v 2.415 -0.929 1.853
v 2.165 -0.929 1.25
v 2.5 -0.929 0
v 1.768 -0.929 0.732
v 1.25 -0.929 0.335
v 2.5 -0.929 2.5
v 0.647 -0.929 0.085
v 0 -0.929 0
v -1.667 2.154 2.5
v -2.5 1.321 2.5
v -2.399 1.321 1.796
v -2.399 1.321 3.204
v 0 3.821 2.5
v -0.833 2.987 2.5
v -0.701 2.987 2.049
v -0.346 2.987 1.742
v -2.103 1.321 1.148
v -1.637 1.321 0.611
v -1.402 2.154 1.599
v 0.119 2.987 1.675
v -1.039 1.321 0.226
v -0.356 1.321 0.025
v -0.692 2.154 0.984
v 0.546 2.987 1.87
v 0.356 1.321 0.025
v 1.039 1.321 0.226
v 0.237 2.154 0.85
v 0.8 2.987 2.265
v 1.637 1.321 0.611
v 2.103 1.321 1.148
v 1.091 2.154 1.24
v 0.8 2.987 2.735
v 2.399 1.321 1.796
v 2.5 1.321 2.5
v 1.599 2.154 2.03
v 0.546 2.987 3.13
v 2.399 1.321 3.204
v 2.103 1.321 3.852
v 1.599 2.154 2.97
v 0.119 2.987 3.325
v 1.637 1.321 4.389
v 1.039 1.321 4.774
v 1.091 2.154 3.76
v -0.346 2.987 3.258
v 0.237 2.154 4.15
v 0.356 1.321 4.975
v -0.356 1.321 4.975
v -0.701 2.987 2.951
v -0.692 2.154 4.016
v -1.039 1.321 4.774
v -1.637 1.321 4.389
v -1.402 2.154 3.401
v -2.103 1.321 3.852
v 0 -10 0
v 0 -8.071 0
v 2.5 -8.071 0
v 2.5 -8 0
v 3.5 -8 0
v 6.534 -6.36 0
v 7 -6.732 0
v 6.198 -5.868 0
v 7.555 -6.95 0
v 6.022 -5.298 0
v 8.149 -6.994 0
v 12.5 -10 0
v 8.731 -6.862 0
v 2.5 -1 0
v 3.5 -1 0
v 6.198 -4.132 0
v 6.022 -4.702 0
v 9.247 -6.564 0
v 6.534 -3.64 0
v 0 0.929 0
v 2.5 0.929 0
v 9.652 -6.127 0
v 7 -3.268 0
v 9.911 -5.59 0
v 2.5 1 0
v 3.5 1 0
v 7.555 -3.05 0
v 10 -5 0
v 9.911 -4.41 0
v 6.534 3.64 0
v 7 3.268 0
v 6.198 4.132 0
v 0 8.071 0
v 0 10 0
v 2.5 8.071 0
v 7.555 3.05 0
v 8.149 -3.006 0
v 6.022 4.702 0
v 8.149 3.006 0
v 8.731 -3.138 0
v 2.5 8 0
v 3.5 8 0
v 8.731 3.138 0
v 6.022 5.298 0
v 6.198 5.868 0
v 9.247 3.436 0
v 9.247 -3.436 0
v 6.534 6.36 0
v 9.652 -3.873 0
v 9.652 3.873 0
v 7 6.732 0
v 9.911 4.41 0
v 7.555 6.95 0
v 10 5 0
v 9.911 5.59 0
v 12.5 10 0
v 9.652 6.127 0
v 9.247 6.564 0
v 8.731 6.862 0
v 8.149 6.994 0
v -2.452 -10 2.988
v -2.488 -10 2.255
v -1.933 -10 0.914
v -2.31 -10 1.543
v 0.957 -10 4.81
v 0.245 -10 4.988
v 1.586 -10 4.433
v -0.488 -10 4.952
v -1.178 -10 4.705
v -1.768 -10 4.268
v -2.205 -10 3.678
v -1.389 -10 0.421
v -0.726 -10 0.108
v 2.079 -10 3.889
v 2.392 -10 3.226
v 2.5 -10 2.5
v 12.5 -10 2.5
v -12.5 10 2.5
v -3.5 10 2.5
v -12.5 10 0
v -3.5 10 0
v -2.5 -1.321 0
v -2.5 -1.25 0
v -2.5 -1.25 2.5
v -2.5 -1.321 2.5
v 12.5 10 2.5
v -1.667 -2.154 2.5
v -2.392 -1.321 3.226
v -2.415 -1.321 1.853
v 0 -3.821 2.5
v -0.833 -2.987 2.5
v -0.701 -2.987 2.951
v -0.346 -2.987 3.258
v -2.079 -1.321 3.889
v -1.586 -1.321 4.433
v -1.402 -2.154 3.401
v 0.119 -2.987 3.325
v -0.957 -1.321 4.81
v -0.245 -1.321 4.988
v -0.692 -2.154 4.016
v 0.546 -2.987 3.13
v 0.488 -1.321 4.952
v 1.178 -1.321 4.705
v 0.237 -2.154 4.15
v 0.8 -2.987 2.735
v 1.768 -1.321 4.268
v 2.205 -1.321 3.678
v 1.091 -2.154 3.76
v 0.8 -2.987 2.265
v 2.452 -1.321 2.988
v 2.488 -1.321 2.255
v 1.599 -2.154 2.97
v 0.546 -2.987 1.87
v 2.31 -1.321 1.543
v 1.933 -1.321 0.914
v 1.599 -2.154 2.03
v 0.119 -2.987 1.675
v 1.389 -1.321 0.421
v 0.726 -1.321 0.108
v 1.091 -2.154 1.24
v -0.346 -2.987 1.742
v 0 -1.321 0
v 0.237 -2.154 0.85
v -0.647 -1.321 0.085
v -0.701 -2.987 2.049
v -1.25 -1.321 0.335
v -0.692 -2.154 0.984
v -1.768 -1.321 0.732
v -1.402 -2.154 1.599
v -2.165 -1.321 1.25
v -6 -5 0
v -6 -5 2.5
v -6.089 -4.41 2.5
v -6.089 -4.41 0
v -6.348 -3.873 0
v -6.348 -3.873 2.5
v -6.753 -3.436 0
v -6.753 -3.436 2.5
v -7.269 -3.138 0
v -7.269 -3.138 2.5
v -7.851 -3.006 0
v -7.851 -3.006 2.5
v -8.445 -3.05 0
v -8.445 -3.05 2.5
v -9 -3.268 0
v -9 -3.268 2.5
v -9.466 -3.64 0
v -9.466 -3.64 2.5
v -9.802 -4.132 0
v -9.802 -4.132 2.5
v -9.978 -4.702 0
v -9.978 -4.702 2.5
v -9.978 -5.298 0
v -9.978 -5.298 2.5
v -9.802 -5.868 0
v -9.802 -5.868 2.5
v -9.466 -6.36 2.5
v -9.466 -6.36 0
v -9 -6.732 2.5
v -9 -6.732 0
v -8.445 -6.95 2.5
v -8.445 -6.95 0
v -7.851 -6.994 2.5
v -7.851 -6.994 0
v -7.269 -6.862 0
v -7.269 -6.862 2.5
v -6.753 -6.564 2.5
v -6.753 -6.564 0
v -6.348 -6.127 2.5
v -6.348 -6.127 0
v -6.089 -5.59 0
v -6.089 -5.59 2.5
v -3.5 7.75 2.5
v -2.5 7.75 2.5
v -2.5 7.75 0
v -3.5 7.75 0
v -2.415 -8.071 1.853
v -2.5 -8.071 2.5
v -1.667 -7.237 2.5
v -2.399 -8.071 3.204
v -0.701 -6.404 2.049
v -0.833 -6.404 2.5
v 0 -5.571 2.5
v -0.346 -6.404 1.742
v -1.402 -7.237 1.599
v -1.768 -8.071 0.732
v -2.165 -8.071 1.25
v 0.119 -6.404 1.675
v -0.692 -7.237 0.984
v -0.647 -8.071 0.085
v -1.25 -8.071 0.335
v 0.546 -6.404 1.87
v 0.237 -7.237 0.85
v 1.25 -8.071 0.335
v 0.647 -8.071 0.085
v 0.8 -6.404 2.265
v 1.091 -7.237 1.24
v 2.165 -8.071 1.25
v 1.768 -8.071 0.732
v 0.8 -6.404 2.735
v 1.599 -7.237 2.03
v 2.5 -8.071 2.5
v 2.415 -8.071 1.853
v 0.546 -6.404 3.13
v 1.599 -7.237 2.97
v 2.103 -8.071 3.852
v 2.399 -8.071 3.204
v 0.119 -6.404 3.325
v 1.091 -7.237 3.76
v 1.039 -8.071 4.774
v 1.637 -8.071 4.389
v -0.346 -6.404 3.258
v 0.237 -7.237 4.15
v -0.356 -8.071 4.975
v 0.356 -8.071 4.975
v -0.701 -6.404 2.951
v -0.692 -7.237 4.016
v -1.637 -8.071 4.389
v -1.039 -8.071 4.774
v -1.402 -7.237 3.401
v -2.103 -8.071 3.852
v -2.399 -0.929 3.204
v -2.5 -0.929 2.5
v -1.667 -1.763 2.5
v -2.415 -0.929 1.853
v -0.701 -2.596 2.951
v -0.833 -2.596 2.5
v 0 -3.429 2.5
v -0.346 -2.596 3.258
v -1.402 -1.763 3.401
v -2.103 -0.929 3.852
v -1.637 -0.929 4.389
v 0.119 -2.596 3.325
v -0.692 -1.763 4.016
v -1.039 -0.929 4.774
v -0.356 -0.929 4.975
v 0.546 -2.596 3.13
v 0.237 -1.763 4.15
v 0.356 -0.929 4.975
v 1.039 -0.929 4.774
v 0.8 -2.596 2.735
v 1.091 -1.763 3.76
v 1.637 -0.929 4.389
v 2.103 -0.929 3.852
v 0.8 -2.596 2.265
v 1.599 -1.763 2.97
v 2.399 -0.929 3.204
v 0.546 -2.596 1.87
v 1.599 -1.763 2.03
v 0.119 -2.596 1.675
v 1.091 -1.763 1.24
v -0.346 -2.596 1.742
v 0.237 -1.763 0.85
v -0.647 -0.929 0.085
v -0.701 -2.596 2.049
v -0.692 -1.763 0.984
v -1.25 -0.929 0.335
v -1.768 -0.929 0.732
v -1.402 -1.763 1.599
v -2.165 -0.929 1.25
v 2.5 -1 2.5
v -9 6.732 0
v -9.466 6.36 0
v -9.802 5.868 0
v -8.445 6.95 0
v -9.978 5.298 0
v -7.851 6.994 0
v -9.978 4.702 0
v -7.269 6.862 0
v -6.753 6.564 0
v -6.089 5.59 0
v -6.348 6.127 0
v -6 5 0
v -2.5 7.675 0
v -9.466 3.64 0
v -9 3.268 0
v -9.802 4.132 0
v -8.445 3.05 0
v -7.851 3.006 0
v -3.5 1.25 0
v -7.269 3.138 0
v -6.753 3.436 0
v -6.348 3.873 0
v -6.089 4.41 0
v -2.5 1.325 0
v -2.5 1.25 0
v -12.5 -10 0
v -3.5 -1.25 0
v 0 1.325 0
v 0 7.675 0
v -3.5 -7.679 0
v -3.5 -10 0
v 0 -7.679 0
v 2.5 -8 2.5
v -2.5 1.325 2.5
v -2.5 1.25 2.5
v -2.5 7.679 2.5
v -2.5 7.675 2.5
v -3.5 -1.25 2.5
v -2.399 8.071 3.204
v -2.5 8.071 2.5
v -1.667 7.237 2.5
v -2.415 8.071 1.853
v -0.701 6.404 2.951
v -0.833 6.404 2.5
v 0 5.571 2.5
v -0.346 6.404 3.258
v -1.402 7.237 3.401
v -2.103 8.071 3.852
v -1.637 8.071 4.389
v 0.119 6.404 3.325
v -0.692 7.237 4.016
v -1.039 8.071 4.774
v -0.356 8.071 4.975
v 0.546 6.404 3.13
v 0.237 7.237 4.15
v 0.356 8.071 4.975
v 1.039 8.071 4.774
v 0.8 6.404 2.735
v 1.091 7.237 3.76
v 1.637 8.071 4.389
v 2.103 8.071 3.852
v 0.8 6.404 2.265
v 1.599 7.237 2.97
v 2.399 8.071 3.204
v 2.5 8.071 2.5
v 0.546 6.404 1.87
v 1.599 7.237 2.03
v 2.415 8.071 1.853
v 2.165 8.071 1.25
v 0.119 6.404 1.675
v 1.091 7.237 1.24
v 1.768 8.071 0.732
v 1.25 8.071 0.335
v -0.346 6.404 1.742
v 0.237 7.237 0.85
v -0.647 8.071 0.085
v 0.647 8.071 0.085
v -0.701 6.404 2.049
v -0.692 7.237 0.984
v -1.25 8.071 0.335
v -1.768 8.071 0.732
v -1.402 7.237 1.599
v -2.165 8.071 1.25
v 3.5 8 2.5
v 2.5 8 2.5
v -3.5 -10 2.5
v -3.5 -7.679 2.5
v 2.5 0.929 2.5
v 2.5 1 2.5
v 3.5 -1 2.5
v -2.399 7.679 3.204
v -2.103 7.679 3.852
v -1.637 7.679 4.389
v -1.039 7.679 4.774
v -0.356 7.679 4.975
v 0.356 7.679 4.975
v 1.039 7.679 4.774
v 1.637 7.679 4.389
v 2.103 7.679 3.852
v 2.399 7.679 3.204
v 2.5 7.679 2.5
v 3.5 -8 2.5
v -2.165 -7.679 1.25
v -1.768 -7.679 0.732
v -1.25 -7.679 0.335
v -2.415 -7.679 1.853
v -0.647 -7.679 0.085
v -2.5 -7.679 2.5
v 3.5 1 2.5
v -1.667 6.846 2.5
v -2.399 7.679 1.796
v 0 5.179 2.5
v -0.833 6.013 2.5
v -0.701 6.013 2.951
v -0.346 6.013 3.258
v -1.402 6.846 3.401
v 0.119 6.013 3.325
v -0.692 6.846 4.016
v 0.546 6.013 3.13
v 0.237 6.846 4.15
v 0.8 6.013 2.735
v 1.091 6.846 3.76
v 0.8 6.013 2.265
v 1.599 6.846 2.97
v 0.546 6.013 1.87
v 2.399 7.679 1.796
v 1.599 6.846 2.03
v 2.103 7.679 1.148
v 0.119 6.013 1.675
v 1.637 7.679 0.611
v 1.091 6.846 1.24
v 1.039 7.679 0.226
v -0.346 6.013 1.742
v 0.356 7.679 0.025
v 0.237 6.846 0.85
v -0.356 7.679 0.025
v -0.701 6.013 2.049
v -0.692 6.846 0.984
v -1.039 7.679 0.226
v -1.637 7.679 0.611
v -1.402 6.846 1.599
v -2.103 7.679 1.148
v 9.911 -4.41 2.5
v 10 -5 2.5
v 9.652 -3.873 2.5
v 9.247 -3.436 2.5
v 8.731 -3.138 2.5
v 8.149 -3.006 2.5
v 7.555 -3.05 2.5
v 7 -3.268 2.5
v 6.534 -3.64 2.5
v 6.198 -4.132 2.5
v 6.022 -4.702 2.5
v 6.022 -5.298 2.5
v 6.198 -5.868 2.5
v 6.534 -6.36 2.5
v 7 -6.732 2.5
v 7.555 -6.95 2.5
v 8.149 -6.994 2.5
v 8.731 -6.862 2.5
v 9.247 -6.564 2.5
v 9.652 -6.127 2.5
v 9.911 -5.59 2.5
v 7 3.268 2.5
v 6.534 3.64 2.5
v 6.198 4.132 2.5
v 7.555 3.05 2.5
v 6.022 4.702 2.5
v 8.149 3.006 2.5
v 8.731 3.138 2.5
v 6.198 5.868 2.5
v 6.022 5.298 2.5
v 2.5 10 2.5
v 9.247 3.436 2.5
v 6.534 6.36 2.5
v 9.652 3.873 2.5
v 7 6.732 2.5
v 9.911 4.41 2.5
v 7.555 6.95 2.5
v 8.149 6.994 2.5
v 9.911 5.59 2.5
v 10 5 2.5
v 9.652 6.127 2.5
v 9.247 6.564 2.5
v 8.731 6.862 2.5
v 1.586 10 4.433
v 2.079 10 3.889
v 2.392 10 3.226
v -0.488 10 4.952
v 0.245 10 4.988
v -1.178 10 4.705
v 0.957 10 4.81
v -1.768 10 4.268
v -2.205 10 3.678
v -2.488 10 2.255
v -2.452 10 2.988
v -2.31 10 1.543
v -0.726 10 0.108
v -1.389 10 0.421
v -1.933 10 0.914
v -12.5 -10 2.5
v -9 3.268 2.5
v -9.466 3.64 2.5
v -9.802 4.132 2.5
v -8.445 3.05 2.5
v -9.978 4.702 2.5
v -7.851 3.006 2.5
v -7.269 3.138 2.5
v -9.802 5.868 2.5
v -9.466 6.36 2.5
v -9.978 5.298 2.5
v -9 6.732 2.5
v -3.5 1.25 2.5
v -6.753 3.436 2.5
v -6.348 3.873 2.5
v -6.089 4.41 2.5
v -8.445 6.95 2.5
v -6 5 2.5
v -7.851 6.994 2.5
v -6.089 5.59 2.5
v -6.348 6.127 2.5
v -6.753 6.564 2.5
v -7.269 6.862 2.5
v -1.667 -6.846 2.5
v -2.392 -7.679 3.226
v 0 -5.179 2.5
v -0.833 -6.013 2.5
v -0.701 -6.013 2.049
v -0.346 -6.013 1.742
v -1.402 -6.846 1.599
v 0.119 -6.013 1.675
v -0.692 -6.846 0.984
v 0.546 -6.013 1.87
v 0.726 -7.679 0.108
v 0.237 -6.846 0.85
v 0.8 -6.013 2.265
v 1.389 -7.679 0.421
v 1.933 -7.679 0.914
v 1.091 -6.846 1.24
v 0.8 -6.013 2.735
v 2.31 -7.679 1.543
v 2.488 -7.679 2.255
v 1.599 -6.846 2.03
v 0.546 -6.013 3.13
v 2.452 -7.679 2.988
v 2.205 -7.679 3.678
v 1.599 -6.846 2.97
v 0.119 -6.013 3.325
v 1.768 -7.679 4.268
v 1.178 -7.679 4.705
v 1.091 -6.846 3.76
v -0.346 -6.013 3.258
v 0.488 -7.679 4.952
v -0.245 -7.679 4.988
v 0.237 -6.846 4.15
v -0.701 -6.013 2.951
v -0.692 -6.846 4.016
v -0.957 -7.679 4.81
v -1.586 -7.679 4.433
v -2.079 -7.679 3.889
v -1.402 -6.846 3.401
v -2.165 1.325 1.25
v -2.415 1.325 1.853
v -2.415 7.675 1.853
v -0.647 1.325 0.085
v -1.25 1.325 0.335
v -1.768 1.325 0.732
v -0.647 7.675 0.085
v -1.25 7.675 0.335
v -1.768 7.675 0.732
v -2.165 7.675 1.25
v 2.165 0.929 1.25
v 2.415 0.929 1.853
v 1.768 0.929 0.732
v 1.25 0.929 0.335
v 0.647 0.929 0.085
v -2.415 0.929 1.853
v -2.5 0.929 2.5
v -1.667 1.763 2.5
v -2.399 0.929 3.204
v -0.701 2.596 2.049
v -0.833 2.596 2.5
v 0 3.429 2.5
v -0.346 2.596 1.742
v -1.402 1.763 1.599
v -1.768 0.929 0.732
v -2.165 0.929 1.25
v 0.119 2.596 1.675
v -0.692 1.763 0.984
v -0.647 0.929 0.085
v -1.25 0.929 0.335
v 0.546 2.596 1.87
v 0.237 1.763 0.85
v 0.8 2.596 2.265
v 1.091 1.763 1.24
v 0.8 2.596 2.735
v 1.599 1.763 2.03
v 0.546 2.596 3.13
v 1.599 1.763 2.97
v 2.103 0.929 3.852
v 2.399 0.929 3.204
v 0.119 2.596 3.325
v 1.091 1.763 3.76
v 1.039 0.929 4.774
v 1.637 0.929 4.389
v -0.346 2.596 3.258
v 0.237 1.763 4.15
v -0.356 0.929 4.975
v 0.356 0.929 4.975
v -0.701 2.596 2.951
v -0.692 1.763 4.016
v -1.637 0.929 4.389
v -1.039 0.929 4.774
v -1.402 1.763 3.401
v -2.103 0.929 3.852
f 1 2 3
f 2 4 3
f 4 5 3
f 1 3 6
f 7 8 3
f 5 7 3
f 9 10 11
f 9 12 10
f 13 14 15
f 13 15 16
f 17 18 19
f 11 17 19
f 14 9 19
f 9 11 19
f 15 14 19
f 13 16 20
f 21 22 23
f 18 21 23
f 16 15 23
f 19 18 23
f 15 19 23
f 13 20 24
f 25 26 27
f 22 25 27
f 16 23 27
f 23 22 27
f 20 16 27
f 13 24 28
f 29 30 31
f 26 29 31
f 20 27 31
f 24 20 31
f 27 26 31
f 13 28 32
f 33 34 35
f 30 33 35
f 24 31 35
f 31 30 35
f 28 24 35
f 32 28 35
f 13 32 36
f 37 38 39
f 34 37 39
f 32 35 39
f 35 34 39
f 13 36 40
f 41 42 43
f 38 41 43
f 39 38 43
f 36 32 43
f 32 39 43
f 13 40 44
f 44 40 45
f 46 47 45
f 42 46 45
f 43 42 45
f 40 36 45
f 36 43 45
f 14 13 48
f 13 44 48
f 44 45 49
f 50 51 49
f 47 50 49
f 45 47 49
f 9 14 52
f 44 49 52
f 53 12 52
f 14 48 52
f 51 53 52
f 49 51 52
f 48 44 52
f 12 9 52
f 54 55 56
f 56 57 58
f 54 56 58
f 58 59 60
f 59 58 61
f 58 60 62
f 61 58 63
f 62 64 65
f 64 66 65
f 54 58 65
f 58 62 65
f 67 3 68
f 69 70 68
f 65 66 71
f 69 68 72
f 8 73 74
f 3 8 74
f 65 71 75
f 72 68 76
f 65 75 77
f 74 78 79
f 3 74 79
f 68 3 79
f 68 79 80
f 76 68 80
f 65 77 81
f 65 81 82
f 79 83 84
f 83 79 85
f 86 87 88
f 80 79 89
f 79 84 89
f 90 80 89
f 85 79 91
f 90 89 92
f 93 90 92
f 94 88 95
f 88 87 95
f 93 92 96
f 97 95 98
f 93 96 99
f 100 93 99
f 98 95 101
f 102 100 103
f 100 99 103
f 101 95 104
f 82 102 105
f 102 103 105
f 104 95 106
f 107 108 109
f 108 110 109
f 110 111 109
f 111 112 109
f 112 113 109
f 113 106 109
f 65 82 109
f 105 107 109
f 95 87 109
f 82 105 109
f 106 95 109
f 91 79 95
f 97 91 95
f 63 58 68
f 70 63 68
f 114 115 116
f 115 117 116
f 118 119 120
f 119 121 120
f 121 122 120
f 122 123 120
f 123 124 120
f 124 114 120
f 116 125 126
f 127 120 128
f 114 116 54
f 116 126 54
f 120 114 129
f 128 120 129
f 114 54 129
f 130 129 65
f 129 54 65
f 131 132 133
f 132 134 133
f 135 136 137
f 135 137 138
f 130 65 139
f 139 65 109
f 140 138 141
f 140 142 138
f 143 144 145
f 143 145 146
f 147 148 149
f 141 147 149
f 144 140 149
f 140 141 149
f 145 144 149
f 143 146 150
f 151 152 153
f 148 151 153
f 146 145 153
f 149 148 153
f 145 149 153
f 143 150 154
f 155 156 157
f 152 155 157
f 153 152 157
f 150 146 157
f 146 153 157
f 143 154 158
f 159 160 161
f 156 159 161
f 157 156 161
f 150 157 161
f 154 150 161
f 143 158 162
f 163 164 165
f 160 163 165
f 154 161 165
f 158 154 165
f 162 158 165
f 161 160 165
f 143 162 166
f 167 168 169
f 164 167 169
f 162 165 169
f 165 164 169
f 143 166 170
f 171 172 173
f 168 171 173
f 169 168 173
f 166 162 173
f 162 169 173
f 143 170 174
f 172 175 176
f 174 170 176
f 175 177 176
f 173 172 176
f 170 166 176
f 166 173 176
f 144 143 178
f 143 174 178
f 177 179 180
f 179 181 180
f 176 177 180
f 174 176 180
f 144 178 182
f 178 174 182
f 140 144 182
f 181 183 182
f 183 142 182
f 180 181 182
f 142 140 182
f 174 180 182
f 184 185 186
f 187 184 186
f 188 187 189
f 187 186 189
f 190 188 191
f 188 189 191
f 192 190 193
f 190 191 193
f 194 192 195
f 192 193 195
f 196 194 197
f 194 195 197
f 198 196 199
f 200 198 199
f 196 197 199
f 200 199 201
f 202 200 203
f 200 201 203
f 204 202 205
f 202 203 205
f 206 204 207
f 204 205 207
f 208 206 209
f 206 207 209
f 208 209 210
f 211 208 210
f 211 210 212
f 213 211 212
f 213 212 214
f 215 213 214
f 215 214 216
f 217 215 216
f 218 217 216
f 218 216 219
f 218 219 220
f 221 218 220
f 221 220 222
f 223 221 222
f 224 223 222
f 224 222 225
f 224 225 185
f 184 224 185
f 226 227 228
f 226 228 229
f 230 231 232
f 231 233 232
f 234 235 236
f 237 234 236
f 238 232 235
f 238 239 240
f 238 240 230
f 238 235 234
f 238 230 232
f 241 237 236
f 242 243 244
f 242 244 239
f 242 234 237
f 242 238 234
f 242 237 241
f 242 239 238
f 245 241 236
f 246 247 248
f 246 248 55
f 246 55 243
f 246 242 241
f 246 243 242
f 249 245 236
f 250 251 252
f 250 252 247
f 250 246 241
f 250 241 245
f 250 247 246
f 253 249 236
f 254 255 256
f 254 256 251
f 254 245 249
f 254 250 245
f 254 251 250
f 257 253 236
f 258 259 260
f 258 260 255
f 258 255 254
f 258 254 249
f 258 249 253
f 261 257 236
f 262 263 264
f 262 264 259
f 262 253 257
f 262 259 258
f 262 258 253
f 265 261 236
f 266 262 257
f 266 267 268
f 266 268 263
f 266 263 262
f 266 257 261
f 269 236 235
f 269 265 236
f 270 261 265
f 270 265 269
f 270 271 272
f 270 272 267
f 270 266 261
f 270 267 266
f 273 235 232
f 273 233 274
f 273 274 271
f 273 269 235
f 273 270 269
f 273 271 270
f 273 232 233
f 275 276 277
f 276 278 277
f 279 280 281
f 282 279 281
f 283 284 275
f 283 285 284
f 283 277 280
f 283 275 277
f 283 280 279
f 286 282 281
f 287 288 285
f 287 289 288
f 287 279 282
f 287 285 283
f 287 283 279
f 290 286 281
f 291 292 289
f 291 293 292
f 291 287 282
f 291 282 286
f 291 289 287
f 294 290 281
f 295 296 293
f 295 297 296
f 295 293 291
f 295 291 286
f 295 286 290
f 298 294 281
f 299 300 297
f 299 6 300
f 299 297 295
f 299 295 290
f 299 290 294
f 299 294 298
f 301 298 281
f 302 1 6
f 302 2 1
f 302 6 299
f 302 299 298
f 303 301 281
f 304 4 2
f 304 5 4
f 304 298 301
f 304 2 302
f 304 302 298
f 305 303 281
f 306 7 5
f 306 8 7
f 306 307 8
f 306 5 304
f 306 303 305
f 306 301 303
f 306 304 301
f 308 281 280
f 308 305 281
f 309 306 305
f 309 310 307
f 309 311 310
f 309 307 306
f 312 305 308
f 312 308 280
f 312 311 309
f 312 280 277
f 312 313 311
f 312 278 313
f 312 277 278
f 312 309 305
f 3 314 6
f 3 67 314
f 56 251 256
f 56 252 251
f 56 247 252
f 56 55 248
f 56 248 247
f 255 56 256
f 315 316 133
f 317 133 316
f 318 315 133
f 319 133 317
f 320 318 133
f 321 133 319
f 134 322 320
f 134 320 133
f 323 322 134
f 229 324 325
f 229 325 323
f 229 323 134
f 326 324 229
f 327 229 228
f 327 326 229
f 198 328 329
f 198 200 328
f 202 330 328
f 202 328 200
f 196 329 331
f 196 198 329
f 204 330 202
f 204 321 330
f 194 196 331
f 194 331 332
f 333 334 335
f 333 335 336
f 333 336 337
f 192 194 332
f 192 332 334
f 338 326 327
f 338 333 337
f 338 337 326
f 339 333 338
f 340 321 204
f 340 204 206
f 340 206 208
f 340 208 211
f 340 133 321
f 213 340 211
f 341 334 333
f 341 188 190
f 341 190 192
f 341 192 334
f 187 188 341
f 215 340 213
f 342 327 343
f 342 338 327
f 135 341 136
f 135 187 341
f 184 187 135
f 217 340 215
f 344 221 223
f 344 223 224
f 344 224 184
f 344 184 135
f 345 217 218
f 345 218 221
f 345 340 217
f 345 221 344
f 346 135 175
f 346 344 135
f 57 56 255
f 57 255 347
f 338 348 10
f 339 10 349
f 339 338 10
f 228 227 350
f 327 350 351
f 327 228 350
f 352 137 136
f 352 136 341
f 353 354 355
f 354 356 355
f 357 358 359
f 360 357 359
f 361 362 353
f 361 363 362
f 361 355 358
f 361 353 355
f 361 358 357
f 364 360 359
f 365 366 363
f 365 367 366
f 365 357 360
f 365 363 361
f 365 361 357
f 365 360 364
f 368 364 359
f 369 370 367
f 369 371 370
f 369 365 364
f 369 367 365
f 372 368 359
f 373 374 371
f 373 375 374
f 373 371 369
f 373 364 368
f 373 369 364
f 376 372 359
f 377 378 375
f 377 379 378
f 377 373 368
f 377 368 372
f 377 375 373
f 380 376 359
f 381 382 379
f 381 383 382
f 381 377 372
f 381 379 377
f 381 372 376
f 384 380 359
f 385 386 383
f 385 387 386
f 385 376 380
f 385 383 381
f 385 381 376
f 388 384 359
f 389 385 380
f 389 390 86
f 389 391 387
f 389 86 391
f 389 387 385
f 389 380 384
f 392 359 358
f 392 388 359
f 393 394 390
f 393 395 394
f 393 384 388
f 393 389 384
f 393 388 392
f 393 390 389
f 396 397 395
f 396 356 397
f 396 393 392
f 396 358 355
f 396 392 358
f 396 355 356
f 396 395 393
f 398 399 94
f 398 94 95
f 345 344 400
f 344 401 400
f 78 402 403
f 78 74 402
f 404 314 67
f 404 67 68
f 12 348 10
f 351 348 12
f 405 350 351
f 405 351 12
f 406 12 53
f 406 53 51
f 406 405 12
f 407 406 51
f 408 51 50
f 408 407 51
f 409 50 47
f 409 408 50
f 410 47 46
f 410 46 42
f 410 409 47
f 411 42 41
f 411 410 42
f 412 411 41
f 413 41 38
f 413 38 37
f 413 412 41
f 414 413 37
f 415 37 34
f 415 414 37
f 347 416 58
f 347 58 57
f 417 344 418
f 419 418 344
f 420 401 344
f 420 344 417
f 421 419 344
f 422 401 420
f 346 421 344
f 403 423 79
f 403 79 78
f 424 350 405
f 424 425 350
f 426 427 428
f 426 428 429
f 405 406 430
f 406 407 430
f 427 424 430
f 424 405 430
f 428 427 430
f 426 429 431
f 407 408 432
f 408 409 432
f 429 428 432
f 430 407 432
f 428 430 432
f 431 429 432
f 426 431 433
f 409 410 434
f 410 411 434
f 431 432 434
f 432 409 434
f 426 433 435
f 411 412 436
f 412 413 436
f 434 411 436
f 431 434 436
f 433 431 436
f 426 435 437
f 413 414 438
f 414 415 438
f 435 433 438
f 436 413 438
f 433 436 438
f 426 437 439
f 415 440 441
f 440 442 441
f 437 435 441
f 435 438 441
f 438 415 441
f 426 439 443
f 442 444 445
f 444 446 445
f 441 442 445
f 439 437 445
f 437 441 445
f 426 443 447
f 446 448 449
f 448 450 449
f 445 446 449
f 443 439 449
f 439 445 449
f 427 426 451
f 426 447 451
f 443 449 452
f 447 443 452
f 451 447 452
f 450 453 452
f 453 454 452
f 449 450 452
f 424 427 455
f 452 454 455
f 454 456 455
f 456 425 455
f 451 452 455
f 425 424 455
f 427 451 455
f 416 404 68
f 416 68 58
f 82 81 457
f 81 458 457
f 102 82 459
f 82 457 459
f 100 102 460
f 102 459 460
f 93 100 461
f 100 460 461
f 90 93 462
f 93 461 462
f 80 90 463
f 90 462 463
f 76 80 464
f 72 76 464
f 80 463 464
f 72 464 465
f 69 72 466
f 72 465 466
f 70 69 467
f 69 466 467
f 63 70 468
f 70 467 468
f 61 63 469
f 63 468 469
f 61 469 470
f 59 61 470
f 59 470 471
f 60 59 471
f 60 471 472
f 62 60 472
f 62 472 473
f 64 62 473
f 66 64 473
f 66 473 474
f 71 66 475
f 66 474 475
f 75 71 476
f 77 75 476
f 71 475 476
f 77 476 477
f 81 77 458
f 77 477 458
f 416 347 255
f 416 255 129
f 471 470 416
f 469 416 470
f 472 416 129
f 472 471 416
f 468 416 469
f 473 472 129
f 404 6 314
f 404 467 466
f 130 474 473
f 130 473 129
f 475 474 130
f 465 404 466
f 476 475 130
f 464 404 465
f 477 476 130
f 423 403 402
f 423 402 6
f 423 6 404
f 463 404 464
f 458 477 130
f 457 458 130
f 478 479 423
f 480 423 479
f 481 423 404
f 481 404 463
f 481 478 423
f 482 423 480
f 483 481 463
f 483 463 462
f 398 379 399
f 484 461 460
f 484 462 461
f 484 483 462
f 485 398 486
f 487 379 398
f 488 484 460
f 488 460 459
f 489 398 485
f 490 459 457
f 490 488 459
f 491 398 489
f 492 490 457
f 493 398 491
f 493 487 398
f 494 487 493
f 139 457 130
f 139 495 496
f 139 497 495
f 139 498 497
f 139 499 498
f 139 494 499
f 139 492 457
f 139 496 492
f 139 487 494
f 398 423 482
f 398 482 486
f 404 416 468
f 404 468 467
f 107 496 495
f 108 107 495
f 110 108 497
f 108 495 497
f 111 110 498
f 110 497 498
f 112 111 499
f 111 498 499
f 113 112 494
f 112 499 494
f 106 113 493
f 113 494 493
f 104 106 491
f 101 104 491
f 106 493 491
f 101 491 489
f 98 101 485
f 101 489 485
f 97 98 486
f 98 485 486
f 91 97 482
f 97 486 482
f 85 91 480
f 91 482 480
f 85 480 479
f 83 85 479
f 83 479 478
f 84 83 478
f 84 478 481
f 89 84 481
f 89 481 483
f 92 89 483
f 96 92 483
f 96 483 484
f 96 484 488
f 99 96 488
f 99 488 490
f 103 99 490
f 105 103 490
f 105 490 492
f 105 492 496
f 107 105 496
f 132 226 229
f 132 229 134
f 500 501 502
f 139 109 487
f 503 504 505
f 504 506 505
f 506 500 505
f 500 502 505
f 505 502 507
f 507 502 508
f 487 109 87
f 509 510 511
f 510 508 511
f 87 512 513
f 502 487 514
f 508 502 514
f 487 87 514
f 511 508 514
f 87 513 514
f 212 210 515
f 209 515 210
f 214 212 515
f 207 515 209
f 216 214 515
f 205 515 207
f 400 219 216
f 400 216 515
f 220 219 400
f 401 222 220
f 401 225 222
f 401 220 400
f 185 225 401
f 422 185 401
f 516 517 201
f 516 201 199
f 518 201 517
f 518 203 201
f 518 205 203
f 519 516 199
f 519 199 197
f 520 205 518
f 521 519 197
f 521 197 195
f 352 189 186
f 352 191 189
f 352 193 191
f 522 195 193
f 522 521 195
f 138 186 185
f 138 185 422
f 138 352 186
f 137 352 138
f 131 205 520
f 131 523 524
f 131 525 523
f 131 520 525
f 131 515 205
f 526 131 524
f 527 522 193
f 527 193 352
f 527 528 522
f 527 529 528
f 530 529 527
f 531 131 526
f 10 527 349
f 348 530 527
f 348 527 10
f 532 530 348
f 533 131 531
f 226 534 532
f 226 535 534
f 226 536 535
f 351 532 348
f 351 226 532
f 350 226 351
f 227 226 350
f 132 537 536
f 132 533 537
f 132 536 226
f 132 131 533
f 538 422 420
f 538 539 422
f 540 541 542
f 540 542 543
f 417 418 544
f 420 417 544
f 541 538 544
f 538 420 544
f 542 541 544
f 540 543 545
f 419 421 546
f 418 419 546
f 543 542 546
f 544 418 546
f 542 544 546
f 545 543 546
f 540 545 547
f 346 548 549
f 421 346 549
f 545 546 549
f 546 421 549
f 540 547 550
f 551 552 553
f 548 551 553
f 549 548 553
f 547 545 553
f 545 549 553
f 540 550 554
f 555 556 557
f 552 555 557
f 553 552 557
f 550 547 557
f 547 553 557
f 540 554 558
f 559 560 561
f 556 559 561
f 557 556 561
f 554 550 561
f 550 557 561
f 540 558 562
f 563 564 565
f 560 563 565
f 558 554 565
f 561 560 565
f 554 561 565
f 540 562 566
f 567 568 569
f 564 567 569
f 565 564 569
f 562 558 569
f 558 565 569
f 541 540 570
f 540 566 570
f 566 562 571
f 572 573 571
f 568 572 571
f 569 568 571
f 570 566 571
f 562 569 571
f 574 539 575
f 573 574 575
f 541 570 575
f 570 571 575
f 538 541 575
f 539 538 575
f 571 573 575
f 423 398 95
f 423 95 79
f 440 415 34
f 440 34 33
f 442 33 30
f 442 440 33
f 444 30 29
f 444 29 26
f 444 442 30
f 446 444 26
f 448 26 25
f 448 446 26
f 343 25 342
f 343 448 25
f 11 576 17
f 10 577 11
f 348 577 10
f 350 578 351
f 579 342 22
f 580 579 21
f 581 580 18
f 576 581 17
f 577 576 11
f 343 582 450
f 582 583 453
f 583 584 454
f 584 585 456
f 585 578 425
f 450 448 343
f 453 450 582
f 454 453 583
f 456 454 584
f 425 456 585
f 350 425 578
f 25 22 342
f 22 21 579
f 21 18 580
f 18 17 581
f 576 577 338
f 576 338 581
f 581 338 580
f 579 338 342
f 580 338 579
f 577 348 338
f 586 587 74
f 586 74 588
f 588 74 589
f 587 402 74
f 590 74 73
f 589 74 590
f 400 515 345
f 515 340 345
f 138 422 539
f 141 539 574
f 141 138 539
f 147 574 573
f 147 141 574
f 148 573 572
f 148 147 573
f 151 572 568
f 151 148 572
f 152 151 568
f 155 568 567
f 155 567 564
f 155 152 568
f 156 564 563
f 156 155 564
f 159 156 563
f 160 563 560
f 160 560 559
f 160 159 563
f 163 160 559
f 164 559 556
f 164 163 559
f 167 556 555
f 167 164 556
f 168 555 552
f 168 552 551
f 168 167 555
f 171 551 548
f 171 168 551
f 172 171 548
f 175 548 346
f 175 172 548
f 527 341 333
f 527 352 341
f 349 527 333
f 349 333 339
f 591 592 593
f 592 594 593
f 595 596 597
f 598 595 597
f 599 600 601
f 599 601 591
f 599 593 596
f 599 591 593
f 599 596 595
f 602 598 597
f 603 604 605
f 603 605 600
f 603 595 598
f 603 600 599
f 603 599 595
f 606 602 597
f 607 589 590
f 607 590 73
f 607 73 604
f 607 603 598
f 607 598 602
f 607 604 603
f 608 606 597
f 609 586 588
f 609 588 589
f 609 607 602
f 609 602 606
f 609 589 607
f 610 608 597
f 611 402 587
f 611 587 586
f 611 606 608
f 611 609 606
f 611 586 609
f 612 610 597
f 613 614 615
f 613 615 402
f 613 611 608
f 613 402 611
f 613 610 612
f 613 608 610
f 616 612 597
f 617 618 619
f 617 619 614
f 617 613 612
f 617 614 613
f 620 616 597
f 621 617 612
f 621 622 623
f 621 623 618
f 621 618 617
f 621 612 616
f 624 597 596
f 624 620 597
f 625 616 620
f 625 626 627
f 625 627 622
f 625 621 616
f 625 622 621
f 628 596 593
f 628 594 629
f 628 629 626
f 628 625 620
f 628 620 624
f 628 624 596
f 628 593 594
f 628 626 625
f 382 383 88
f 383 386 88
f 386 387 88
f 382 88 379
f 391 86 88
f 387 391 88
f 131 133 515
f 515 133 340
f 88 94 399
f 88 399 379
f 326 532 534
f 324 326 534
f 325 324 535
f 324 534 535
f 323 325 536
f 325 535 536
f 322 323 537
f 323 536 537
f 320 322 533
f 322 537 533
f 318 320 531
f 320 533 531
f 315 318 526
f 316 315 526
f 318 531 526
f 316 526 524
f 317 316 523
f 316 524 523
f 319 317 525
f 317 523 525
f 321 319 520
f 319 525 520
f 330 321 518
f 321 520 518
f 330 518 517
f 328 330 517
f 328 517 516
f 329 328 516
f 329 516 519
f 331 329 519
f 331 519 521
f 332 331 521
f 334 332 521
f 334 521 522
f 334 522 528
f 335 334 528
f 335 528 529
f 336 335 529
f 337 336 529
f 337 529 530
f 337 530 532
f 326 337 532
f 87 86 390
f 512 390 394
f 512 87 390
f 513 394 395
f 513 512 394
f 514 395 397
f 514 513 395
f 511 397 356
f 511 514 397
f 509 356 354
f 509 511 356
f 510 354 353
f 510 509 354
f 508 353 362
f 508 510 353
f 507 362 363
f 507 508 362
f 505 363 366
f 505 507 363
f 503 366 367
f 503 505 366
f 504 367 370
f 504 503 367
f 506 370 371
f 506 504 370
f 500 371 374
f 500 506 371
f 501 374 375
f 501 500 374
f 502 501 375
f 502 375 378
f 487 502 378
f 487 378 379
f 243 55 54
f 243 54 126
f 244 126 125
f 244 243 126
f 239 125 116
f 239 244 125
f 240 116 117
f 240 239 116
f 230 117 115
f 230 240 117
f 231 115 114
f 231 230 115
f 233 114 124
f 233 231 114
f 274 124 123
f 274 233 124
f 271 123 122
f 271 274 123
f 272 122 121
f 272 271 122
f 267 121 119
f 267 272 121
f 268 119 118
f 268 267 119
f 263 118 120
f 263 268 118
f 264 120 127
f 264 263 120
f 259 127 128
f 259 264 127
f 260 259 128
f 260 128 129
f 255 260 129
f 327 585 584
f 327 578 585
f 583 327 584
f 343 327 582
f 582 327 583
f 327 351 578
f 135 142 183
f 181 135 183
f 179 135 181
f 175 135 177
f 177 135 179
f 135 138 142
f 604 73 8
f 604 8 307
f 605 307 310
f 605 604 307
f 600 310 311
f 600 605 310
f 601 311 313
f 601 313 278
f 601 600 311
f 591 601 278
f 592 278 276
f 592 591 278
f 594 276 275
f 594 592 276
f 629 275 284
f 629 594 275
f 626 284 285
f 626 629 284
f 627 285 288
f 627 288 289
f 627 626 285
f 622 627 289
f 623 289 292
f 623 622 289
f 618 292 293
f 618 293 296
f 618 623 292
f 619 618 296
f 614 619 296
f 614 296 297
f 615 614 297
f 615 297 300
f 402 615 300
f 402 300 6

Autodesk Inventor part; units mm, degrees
ref_plane "YZ Plane" through (0, 0, 0) normal (1, 0, 0) x (0, 1, 0)
ref_plane "XZ Plane" through (0, 0, 0) normal (0, 1, 0) x (-1, 0, 0)
sketch "Sketch1" plane through (0, 0, 0) normal (0, 0, 1) x (1, 0, 0)
  line L0 (12.5, -10) -> (12.5, 10)
  line L1 (-12.5, 10) -> (-12.5, -10)
  line L2 (-12.5, -10) -> (12.5, 10) construction
  line L3 (12.5, -10) -> (-12.5, 10) construction
  line L4 (2.5, -10) -> (2.5, 10)
  line L5 (-2.5, 10) -> (-2.5, -10)
  line L6 (-2.5, -10) -> (2.5, 10) construction
  line L7 (2.5, -10) -> (-2.5, 10) construction
  line L8 (12.5, 10) -> (2.5, 10)
  line L9 (-2.5, 10) -> (-12.5, 10)
  line L10 (-12.5, -10) -> (-2.5, -10)
  line L11 (2.5, -10) -> (12.5, -10)
  point P0 (0, 0)
  dimension "d0" = 25
  dimension "d1" = 20
  dimension "d2" = 5
  dimension "d3" = 20
  dimension "d4" = 38.66
  dimension "d5" = 75.964
extrude "Extrusion1" add sketch "Sketch1" along normal blind 2.5
sketch "Sketch2" plane through (0, 0, 2.5) normal (0, 0, 1) x (1, 0, 0)
  line L0 (-2.5, -10) -> (-2.5, 10) projected
  line L1 (12.5, 10) -> (2.5, 10) projected
  line L2 (-2.5, 10) -> (0, 10)
  line L3 (2.5, 10) -> (2.5, -10) projected
  line L4 (-2.5, 10) -> (-2.5, 8.0707)
  line L5 (0, 5.5707) -> (0, 10)
  line L6 (-2.5, 7.75) -> (1.5, 7.75) construction
  line L7 (-2.5, 0) -> (-2.5, 1)
  line L8 (0, 0) -> (0, 3.5)
  line L9 (-2.5, 1) -> (-2.5, 1.25) construction
  line L10 (0, 3.75) -> (0, 5.1793)
  line L11 (-2.5, 1.25) -> (-2.5, 7.6793)
  line L12 (-2.5, -10) -> (0, -10)
  line L13 (-2.5, -10) -> (-2.5, -8.0707)
  line L14 (0, -5.5707) -> (0, -10)
  line L15 (-2.5, 0) -> (-2.5, -0.9293)
  line L16 (0, 0) -> (0, -3.4293)
  line L17 (-2.5, -1) -> (-2.5, -1.25) construction
  line L18 (0, -3.8207) -> (0, -5.1793)
  line L19 (-2.5, -1.3207) -> (-2.5, -7.6793)
  line L20 (0, -5.5707) -> (-2.5, -8.0707)
  line L21 (0, -5.1793) -> (-2.5, -7.6793)
  line L22 (0, -3.8207) -> (-2.5, -1.3207)
  line L23 (0, -3.4293) -> (-2.5, -0.9293)
  line L24 (0, 3.8207) -> (-2.5, 1.3207)
  line L25 (0, 5.1793) -> (-2.5, 7.6793)
  line L26 (0, 5.5707) -> (-2.5, 8.0707)
  line L27 (-2.5, 0.9293) -> (0, 3.4293)
  point P0 (-2.5, 8)
  dimension "d11" = 2
  dimension "d15" = 1
  dimension "d18" = 0.25
  dimension "d19" = 90
  dimension "d20" = 90
  dimension "d21" = 90
  dimension "d22" = 90
  dimension "d23" = 90
  dimension "d24" = 90
  dimension "d25" = 90
  dimension "d26" = 2.5
  dimension "d27" = 2.25
  dimension "d28" = 2.5
  dimension "d33" = 12.5
  dimension "d34" = 12.5
  dimension "d35" = 1
  dimension "d73" = 45
  dimension "d74" = 90
  dimension "d75" = 6.364
  dimension "d76" = 6.6407
  dimension "d77" = 0.2768
  dimension "d78" = 6.364
  dimension "d79" = 6.0872
  dimension "d80" = 0.2768
  dimension "d81" = 4.4694
  dimension "d82" = 12.2476
  dimension "d83" = 15
  dimension "d84" = 15
  dimension "d85" = 6.25
  dimension "d86" = 6.5
  dimension "d87" = 11
  dimension "d88" = 11.25
revolve "Revolution1" add sketch "Sketch2" angle 360 about axis through (0, 0, 2.5) along (0, 1, 0)
sketch "Sketch4" plane through (0, 0, 2.5) normal (0, 0, 1) x (1, 0, 0)
  line L0 (-2.5, -1.3207) -> (-2.5, 8.0707) projected
  line L1 (-2.5, 7.75) -> (-3.5, 7.75)
  line L2 (-3.5, 7.75) -> (-3.5, 10)
  line L3 (-3.5, 10) -> (-2.5, 10)
  line L4 (-2.5, 10) -> (-2.5, 7.75)
  line L5 (2.5, 10) -> (2.5, 8.0707) projected
  line L6 (2.5, 8) -> (3.5, 8)
  line L7 (3.5, 8) -> (3.5, 1)
  line L8 (3.5, 1) -> (2.5, 1)
  line L9 (2.5, 1) -> (2.5, 8)
  line L10 (-2.5, -7.6793) -> (-2.5, -1.3207) projected
  line L11 (-2.5, -1.25) -> (-3.5, -1.25)
  line L12 (-3.5, -1.25) -> (-3.5, 1.25)
  line L13 (-3.5, 1.25) -> (-2.5, 1.25)
  line L14 (-2.5, 1.25) -> (-2.5, -1.25)
  line L15 (2.5, 0.9293) -> (2.5, -0.9293) projected
  line L16 (2.5, -1) -> (3.5, -1)
  line L17 (3.5, -1) -> (3.5, -8)
  line L18 (3.5, -8) -> (2.5, -8)
  line L19 (2.5, -8) -> (2.5, -1)
  line L20 (2.5, -7.6793) -> (-2.5, -7.6793) projected
  line L21 (-2.5, -10) -> (-12.5, -10) projected
  line L22 (-2.5, -7.6793) -> (-3.5, -7.6793)
  line L23 (-3.5, -7.6793) -> (-3.5, -10)
  line L24 (-3.5, -10) -> (-2.5, -10)
  line L25 (-2.5, -10) -> (-2.5, -7.6793)
  point P0 (0, 0)
  point P1 (-2.5, 8)
  point P2 (0, -7.6793)
  dimension "d39" = 1
  dimension "d40" = 2.25
  dimension "d41" = 1
  dimension "d42" = 7
  dimension "d43" = 1
  dimension "d44" = 2.5
  dimension "d45" = 1
  dimension "d46" = 7
  dimension "d47" = 1
extrude "Extrusion3" cut sketch "Sketch4" against normal blind 2.5
sketch "Sketch5" plane through (0, 0, 2.5) normal (0, 0, 1) x (1, 0, 0)
  circle A0 centre (8, -5) radius 2
  line L0 (2.5, -10) -> (12.5, -10) projected
  line L1 (12.5, -10) -> (12.5, 10) projected
  line L2 (-12.5, 10) -> (-12.5, -10) projected
  line L3 (-12.5, -10) -> (-3.5, -10) projected
  circle A1 centre (8, 5) radius 2
  circle A2 centre (-8, -5) radius 2
  circle A3 centre (-8, 5) radius 2
  point P0 (0, 0)
  dimension "d50" = 4
  dimension "d51" = 5
  dimension "d52" = 4.5
  dimension "d57" = 10
  dimension "d60" = 16
extrude "Extrusion4" cut sketch "Sketch5" against normal blind 2.5
sketch "Sketch6" plane through (0, 0, 0) normal (0, 0, -1) x (-1, 0, 0)
  line L0 (-2.5, 8) -> (-2.5, 10) projected
  line L1 (2.5, 8.0707) -> (-2.5, 8.0707) projected
  line L2 (-2.5, 10) -> (0, 10)
  line L3 (0, 10) -> (0, 8.0707)
  line L4 (0, 8.0707) -> (-2.5, 8.0707)
  line L5 (-2.5, 8.0707) -> (-2.5, 10)
  line L6 (2.5, 7.6793) -> (0, 5.1793) projected
  line L7 (2.5, 1.25) -> (3.5, 1.25) projected
  line L8 (-2.5, 0.9293) -> (-2.5, -0.9293) projected
  line L9 (2.5, -0.9293) -> (-2.5, -0.9293) projected
  line L10 (-2.5, 0.9293) -> (0, 0.9293)
  line L11 (0, 0.9293) -> (0, -0.9293)
  line L12 (0, -0.9293) -> (-2.5, -0.9293)
  line L13 (-2.5, -0.9293) -> (-2.5, 0.9293)
  line L14 (-2.5, -8.0707) -> (-2.5, -10) projected
  line L15 (2.5, -8.0707) -> (-2.5, -8.0707) projected
  line L16 (-2.5, -10) -> (0, -10)
  line L17 (0, -10) -> (0, -8.0707)
  line L18 (0, -8.0707) -> (-2.5, -8.0707)
  line L19 (-2.5, -8.0707) -> (-2.5, -10)
  line L20 (0, 3.8207) -> (2.5, 1.3207) projected
  line L21 (0, -5.1793) -> (-2.5, -7.6793) projected
  line L22 (-2.5, -1.3207) -> (0, -3.8207) projected
  line L23 (0, -3.8207) -> (0, -5.1793)
  line L24 (0, -5.1793) -> (2.5, -7.6793) projected
  line L25 (0, 5.1793) -> (2.5, 5.1793)
  line L26 (2.5, 7.75) -> (2.5, 1.25) projected
  line L27 (0, 3.8207) -> (2.5, 3.8207)
  line L28 (2.5, 3.8207) -> (2.5, 5.1793)
  line L29 (0, -3.8207) -> (2.5, -3.8207)
  line L30 (2.5, -1.25) -> (2.5, -7.6793) projected
  line L31 (0, -5.1793) -> (2.5, -5.1793)
  line L32 (2.5, -3.8207) -> (2.5, -5.1793)
  line L33 (0, 5.1793) -> (0, 3.8207)
  point P0 (0, 0)
  point P1 (2.5, -1.3207)
extrude "Extrusion5" add sketch "Sketch6" against normal blind 2.5 contours L0 L2 L3 L1 | L25 L26 L27 L33 | L10 L11 L9 L8 | L15 L17 L16 L14 | L29 L30 L31 L23
sketch "Sketch7" plane through (-2.5, -5.1793, 0) normal (0, -1, 0) x (1, 0, 0)
  line L0 (2.5, 0) -> (0, 0)
  circle A0 centre (2.5, 2.5) radius 2.5 projected
  line L1 (0, 0) -> (0, 2.5) projected
  line L2 (0, 0) -> (0, 2.5)
  line L3 (-1, 2.5) -> (0, 2.5) projected
  arc A1 (0, 2.5) -> (2.5, 0) centre (2.5, 2.5) ccw
extrude "Extrusion6" add sketch "Sketch7" along normal blind 2.5 contours L0 L1 A0
sketch "Sketch8" plane through (-2.5, -3.8207, 0) normal (0, 1, 0) x (1, 0, 0)
  line L0 (0, -2.5) -> (-1, -2.5) projected
  line L1 (0, 0) -> (2.5, 0) projected
  line L2 (0, -2.5) -> (0, 0)
  line L3 (0, 0) -> (2.5, 0)
  line L4 (0, 0) -> (0, -2.5) projected
  arc A0 (2.5, 0) -> (0, -2.5) centre (2.5, -2.5) ccw
extrude "Extrusion7" add sketch "Sketch8" along normal blind 2.5
ref_plane "Work Plane1" through (-2.5, 4.5, 0) normal (0, 1, 0) x (1, 0, 0)
sketch "Sketch9" plane through (-2.5, 4.5, 0) normal (0, 1, 0) x (1, 0, 0)
  line L0 (0, -2.5) -> (-1, -2.5) projected
  line L1 (0, -2.5) -> (0, 0) projected
  line L2 (0, -2.5) -> (0, 0)
  line L3 (2.5, 0) -> (0, 0) projected
  line L4 (0, 0) -> (2.5, 0)
  arc A0 (2.5, 0) -> (0, -2.5) centre (2.5, -2.5) ccw
extrude "Extrusion8" add sketch "Sketch9" along normal mid plane 6.35
properties part number "26.2 scharnier 0.3 mm speling"
